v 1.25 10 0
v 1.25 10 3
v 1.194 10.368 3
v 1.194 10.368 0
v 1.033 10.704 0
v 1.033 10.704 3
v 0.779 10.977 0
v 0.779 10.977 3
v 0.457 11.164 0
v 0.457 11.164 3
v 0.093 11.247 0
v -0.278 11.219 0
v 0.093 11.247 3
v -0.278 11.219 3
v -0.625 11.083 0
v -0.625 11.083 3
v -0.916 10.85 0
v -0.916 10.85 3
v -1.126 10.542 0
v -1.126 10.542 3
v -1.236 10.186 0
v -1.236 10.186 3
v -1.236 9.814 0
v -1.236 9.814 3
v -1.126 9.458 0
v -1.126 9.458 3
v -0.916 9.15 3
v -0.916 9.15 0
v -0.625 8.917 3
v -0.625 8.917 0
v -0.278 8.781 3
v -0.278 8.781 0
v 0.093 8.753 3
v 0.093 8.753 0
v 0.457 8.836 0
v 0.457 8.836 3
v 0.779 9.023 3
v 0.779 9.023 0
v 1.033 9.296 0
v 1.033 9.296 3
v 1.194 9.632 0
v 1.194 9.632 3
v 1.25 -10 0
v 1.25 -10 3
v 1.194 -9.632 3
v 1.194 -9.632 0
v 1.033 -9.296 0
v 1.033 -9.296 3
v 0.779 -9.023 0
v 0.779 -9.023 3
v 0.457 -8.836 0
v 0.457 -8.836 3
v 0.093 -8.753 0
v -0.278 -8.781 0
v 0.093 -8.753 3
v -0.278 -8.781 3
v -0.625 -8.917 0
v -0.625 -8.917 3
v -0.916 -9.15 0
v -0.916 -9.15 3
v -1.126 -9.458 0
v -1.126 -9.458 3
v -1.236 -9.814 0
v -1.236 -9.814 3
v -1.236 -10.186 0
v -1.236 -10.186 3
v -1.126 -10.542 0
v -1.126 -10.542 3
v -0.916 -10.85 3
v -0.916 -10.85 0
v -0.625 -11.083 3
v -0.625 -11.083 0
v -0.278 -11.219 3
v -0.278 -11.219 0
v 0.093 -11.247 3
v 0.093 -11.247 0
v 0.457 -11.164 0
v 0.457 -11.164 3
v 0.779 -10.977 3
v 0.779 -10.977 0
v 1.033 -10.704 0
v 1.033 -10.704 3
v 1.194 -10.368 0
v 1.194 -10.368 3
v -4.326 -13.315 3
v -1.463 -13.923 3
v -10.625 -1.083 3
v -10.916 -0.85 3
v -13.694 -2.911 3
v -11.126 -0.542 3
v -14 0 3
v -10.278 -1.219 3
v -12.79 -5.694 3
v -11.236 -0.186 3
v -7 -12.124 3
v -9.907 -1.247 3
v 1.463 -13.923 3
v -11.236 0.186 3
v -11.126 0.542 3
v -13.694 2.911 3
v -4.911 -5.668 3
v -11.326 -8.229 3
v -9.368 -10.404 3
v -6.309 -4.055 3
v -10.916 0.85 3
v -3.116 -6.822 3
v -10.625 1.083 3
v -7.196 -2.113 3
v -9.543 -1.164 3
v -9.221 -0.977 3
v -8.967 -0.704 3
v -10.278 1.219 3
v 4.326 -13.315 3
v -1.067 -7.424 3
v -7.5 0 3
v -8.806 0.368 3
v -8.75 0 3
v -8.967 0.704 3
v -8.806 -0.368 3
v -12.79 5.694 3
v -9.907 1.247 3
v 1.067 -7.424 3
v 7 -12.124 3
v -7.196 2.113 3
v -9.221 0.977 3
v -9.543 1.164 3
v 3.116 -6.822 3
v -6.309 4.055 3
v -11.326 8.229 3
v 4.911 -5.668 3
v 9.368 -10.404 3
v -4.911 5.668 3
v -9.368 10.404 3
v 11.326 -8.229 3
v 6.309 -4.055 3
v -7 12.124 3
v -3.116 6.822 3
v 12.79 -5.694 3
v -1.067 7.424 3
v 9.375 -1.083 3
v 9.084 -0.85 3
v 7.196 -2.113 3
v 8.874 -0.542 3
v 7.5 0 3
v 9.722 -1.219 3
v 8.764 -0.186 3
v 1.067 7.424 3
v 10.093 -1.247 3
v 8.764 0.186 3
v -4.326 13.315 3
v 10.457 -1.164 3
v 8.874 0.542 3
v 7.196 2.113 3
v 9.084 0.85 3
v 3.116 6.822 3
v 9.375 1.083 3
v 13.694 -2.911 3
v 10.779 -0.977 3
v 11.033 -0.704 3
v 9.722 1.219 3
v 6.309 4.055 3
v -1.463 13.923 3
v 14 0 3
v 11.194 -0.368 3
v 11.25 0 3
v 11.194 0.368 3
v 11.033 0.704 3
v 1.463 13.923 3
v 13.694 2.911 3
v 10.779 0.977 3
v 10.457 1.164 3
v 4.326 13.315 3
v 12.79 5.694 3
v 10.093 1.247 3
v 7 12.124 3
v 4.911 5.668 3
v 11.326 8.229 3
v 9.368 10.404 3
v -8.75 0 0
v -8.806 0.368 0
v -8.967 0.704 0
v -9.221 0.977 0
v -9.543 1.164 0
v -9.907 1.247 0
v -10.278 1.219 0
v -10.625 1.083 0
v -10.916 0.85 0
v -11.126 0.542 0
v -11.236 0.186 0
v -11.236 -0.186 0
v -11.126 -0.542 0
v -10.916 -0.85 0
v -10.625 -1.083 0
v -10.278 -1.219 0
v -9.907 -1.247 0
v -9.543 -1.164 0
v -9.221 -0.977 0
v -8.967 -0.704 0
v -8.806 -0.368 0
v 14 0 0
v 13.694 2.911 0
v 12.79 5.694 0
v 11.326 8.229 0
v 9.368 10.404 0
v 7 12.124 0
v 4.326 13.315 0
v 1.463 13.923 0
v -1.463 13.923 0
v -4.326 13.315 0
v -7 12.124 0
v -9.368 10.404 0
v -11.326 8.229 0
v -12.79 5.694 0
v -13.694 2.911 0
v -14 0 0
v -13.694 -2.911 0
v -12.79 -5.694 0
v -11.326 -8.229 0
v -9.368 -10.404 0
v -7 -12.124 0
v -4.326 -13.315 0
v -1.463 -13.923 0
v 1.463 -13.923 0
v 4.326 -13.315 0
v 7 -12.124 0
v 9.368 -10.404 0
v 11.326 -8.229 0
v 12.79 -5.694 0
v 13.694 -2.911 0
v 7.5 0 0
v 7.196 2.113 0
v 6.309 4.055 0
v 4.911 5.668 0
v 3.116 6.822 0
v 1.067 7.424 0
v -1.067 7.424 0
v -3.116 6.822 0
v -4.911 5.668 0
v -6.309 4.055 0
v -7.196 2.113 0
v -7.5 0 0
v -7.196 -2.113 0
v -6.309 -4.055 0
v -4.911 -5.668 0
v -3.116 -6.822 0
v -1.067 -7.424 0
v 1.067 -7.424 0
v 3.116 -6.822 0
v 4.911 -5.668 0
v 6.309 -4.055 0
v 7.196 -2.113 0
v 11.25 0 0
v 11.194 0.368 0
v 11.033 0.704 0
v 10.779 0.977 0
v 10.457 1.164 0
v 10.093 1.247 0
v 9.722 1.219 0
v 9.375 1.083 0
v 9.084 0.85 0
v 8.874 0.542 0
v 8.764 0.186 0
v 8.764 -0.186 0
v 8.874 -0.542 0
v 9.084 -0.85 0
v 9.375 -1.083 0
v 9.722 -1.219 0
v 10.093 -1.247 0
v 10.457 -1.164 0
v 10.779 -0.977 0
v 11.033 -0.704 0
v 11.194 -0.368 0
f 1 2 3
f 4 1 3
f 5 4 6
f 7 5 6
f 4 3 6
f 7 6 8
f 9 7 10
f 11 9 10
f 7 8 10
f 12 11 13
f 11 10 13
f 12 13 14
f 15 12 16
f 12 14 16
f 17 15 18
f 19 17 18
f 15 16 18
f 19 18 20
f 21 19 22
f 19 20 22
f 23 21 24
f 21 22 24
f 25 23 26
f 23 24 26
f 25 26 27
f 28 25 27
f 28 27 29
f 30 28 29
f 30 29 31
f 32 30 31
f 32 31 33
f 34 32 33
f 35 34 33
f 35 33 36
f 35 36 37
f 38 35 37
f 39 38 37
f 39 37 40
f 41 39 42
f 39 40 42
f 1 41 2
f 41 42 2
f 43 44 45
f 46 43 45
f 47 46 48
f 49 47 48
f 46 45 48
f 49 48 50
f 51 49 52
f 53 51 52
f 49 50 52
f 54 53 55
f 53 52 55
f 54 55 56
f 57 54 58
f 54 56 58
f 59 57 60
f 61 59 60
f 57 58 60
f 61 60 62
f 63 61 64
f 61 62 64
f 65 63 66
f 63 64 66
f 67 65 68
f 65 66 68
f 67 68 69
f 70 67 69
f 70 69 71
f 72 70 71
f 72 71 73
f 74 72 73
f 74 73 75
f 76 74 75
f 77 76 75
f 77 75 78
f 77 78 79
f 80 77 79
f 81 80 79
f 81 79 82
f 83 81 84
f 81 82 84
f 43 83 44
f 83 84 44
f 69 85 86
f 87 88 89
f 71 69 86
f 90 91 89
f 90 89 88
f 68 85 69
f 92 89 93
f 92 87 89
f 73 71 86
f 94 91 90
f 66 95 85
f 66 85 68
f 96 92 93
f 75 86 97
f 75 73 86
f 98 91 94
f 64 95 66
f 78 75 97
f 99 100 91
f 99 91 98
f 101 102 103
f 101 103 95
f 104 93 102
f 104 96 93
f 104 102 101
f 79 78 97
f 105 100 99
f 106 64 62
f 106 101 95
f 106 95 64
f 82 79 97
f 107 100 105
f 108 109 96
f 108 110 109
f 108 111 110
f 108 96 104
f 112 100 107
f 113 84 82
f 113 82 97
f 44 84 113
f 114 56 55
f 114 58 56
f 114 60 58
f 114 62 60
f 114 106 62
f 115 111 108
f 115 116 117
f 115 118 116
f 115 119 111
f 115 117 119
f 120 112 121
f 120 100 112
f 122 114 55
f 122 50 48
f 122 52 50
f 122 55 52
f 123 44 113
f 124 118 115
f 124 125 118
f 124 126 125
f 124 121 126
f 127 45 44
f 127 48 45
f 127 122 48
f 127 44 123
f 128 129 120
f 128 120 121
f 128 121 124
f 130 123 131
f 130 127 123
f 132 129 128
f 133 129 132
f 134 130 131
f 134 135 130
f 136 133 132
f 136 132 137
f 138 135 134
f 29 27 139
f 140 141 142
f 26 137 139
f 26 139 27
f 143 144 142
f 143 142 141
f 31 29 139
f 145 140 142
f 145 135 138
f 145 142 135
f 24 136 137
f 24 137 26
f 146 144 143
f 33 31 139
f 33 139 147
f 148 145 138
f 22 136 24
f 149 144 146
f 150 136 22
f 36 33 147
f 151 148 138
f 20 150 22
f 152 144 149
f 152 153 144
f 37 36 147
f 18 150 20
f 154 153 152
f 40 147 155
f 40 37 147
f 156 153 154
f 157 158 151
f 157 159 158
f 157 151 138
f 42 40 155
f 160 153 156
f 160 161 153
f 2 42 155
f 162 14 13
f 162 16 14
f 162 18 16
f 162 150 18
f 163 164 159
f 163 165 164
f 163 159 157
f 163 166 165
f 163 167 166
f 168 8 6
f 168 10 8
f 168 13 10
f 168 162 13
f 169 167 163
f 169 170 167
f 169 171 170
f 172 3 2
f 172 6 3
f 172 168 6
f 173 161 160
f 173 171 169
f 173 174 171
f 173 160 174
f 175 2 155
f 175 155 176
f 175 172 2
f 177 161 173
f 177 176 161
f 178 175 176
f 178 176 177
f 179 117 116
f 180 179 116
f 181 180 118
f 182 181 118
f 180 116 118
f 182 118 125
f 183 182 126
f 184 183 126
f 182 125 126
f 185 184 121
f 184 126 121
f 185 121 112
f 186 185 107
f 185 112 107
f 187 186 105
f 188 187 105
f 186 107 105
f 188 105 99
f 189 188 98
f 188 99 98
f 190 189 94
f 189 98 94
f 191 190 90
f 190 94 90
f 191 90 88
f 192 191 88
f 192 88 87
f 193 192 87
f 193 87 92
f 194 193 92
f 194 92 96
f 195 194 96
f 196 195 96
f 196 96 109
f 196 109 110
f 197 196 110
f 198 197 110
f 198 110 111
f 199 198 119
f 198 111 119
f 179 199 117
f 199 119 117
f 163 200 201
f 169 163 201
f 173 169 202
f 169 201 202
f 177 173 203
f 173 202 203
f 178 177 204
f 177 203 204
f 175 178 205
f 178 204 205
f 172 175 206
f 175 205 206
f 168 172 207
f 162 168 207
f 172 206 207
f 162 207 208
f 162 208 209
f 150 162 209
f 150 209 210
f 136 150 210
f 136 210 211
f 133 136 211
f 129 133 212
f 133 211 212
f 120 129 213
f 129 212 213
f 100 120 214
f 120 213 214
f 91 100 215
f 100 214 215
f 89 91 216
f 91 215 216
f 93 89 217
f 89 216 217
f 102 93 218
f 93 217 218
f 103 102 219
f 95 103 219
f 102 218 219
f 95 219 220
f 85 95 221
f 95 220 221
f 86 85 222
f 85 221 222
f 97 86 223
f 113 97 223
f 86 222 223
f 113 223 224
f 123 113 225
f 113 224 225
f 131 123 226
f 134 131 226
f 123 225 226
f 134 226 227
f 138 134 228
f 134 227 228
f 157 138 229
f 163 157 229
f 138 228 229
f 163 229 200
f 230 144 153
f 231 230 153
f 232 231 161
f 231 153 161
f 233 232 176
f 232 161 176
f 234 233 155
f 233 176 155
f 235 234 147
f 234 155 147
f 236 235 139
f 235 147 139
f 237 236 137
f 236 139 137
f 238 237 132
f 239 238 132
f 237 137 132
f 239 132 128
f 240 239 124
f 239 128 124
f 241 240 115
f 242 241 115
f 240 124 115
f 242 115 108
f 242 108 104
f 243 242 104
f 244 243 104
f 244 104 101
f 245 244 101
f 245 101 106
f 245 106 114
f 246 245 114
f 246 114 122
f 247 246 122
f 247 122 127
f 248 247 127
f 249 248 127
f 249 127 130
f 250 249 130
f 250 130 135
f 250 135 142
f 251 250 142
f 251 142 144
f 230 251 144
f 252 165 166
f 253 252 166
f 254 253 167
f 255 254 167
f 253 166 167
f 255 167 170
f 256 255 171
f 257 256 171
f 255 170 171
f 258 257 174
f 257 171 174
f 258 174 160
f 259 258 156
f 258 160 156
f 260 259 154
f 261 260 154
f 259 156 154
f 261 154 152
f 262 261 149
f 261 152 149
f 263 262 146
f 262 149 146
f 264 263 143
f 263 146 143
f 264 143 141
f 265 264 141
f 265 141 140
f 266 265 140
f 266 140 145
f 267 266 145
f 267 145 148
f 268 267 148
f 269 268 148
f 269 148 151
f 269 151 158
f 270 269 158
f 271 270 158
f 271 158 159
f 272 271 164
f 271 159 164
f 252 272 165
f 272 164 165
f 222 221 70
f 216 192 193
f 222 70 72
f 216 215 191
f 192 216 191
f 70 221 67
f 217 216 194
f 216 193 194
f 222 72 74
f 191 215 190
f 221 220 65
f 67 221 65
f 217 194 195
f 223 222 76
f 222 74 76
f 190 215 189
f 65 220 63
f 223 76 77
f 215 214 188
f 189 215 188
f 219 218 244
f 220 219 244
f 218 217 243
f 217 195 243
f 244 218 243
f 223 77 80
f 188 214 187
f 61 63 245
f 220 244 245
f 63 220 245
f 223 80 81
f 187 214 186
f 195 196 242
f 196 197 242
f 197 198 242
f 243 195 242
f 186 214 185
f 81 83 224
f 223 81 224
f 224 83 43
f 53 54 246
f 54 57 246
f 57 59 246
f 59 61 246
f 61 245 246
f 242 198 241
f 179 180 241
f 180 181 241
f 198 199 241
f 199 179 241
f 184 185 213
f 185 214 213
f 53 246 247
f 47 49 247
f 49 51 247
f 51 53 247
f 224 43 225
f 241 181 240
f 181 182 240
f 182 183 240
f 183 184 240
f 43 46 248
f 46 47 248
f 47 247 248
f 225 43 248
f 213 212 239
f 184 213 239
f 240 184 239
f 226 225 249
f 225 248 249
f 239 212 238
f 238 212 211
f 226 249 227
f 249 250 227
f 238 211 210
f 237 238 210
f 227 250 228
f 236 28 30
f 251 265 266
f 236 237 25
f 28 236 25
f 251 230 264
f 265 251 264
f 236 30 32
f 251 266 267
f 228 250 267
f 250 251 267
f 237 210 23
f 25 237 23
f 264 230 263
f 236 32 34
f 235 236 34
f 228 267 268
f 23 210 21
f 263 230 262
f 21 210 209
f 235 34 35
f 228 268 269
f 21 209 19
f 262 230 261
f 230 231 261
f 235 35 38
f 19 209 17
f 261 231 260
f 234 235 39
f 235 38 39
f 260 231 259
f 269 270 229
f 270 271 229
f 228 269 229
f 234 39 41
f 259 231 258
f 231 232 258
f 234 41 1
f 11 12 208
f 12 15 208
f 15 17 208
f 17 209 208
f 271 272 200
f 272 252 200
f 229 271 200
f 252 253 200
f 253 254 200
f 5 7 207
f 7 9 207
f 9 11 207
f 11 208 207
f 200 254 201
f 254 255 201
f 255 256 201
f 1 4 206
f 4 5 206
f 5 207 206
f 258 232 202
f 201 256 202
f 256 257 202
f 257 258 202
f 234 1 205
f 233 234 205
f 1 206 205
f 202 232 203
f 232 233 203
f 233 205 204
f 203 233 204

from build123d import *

# Parameters (mm, degrees)
SKETCH_1_R          = 14
EXTRUDE_1_DEPTH     = 3
SKETCH_3_R          = 1.25
CUT_EXTRUDE_1_DEPTH = 3
SKETCH_7_R          = 7.5
CUT_EXTRUDE_2_DEPTH = 10


with BuildPart() as part:
    # 草图1 → 凸台-拉伸1 (new body)
    with BuildSketch(Plane.XY):
        Circle(SKETCH_1_R)
    extrude(amount=EXTRUDE_1_DEPTH)

    # 草图3 → 切除-拉伸1 (cut)
    with BuildSketch(Plane.XY.offset(3)):
        with Locations((10, 0)):
            Circle(SKETCH_3_R)
        with Locations((0, 10)):
            Circle(SKETCH_3_R)
        with Locations((-10, 0)):
            Circle(SKETCH_3_R)
        with Locations((0, -10)):
            Circle(SKETCH_3_R)
    extrude(amount=-CUT_EXTRUDE_1_DEPTH, mode=Mode.SUBTRACT)

    # 草图7 → 切除-拉伸2 (cut)
    with BuildSketch(Plane.XY.offset(3)):
        Circle(SKETCH_7_R)
    extrude(amount=-CUT_EXTRUDE_2_DEPTH, mode=Mode.SUBTRACT)


solid = part.part
